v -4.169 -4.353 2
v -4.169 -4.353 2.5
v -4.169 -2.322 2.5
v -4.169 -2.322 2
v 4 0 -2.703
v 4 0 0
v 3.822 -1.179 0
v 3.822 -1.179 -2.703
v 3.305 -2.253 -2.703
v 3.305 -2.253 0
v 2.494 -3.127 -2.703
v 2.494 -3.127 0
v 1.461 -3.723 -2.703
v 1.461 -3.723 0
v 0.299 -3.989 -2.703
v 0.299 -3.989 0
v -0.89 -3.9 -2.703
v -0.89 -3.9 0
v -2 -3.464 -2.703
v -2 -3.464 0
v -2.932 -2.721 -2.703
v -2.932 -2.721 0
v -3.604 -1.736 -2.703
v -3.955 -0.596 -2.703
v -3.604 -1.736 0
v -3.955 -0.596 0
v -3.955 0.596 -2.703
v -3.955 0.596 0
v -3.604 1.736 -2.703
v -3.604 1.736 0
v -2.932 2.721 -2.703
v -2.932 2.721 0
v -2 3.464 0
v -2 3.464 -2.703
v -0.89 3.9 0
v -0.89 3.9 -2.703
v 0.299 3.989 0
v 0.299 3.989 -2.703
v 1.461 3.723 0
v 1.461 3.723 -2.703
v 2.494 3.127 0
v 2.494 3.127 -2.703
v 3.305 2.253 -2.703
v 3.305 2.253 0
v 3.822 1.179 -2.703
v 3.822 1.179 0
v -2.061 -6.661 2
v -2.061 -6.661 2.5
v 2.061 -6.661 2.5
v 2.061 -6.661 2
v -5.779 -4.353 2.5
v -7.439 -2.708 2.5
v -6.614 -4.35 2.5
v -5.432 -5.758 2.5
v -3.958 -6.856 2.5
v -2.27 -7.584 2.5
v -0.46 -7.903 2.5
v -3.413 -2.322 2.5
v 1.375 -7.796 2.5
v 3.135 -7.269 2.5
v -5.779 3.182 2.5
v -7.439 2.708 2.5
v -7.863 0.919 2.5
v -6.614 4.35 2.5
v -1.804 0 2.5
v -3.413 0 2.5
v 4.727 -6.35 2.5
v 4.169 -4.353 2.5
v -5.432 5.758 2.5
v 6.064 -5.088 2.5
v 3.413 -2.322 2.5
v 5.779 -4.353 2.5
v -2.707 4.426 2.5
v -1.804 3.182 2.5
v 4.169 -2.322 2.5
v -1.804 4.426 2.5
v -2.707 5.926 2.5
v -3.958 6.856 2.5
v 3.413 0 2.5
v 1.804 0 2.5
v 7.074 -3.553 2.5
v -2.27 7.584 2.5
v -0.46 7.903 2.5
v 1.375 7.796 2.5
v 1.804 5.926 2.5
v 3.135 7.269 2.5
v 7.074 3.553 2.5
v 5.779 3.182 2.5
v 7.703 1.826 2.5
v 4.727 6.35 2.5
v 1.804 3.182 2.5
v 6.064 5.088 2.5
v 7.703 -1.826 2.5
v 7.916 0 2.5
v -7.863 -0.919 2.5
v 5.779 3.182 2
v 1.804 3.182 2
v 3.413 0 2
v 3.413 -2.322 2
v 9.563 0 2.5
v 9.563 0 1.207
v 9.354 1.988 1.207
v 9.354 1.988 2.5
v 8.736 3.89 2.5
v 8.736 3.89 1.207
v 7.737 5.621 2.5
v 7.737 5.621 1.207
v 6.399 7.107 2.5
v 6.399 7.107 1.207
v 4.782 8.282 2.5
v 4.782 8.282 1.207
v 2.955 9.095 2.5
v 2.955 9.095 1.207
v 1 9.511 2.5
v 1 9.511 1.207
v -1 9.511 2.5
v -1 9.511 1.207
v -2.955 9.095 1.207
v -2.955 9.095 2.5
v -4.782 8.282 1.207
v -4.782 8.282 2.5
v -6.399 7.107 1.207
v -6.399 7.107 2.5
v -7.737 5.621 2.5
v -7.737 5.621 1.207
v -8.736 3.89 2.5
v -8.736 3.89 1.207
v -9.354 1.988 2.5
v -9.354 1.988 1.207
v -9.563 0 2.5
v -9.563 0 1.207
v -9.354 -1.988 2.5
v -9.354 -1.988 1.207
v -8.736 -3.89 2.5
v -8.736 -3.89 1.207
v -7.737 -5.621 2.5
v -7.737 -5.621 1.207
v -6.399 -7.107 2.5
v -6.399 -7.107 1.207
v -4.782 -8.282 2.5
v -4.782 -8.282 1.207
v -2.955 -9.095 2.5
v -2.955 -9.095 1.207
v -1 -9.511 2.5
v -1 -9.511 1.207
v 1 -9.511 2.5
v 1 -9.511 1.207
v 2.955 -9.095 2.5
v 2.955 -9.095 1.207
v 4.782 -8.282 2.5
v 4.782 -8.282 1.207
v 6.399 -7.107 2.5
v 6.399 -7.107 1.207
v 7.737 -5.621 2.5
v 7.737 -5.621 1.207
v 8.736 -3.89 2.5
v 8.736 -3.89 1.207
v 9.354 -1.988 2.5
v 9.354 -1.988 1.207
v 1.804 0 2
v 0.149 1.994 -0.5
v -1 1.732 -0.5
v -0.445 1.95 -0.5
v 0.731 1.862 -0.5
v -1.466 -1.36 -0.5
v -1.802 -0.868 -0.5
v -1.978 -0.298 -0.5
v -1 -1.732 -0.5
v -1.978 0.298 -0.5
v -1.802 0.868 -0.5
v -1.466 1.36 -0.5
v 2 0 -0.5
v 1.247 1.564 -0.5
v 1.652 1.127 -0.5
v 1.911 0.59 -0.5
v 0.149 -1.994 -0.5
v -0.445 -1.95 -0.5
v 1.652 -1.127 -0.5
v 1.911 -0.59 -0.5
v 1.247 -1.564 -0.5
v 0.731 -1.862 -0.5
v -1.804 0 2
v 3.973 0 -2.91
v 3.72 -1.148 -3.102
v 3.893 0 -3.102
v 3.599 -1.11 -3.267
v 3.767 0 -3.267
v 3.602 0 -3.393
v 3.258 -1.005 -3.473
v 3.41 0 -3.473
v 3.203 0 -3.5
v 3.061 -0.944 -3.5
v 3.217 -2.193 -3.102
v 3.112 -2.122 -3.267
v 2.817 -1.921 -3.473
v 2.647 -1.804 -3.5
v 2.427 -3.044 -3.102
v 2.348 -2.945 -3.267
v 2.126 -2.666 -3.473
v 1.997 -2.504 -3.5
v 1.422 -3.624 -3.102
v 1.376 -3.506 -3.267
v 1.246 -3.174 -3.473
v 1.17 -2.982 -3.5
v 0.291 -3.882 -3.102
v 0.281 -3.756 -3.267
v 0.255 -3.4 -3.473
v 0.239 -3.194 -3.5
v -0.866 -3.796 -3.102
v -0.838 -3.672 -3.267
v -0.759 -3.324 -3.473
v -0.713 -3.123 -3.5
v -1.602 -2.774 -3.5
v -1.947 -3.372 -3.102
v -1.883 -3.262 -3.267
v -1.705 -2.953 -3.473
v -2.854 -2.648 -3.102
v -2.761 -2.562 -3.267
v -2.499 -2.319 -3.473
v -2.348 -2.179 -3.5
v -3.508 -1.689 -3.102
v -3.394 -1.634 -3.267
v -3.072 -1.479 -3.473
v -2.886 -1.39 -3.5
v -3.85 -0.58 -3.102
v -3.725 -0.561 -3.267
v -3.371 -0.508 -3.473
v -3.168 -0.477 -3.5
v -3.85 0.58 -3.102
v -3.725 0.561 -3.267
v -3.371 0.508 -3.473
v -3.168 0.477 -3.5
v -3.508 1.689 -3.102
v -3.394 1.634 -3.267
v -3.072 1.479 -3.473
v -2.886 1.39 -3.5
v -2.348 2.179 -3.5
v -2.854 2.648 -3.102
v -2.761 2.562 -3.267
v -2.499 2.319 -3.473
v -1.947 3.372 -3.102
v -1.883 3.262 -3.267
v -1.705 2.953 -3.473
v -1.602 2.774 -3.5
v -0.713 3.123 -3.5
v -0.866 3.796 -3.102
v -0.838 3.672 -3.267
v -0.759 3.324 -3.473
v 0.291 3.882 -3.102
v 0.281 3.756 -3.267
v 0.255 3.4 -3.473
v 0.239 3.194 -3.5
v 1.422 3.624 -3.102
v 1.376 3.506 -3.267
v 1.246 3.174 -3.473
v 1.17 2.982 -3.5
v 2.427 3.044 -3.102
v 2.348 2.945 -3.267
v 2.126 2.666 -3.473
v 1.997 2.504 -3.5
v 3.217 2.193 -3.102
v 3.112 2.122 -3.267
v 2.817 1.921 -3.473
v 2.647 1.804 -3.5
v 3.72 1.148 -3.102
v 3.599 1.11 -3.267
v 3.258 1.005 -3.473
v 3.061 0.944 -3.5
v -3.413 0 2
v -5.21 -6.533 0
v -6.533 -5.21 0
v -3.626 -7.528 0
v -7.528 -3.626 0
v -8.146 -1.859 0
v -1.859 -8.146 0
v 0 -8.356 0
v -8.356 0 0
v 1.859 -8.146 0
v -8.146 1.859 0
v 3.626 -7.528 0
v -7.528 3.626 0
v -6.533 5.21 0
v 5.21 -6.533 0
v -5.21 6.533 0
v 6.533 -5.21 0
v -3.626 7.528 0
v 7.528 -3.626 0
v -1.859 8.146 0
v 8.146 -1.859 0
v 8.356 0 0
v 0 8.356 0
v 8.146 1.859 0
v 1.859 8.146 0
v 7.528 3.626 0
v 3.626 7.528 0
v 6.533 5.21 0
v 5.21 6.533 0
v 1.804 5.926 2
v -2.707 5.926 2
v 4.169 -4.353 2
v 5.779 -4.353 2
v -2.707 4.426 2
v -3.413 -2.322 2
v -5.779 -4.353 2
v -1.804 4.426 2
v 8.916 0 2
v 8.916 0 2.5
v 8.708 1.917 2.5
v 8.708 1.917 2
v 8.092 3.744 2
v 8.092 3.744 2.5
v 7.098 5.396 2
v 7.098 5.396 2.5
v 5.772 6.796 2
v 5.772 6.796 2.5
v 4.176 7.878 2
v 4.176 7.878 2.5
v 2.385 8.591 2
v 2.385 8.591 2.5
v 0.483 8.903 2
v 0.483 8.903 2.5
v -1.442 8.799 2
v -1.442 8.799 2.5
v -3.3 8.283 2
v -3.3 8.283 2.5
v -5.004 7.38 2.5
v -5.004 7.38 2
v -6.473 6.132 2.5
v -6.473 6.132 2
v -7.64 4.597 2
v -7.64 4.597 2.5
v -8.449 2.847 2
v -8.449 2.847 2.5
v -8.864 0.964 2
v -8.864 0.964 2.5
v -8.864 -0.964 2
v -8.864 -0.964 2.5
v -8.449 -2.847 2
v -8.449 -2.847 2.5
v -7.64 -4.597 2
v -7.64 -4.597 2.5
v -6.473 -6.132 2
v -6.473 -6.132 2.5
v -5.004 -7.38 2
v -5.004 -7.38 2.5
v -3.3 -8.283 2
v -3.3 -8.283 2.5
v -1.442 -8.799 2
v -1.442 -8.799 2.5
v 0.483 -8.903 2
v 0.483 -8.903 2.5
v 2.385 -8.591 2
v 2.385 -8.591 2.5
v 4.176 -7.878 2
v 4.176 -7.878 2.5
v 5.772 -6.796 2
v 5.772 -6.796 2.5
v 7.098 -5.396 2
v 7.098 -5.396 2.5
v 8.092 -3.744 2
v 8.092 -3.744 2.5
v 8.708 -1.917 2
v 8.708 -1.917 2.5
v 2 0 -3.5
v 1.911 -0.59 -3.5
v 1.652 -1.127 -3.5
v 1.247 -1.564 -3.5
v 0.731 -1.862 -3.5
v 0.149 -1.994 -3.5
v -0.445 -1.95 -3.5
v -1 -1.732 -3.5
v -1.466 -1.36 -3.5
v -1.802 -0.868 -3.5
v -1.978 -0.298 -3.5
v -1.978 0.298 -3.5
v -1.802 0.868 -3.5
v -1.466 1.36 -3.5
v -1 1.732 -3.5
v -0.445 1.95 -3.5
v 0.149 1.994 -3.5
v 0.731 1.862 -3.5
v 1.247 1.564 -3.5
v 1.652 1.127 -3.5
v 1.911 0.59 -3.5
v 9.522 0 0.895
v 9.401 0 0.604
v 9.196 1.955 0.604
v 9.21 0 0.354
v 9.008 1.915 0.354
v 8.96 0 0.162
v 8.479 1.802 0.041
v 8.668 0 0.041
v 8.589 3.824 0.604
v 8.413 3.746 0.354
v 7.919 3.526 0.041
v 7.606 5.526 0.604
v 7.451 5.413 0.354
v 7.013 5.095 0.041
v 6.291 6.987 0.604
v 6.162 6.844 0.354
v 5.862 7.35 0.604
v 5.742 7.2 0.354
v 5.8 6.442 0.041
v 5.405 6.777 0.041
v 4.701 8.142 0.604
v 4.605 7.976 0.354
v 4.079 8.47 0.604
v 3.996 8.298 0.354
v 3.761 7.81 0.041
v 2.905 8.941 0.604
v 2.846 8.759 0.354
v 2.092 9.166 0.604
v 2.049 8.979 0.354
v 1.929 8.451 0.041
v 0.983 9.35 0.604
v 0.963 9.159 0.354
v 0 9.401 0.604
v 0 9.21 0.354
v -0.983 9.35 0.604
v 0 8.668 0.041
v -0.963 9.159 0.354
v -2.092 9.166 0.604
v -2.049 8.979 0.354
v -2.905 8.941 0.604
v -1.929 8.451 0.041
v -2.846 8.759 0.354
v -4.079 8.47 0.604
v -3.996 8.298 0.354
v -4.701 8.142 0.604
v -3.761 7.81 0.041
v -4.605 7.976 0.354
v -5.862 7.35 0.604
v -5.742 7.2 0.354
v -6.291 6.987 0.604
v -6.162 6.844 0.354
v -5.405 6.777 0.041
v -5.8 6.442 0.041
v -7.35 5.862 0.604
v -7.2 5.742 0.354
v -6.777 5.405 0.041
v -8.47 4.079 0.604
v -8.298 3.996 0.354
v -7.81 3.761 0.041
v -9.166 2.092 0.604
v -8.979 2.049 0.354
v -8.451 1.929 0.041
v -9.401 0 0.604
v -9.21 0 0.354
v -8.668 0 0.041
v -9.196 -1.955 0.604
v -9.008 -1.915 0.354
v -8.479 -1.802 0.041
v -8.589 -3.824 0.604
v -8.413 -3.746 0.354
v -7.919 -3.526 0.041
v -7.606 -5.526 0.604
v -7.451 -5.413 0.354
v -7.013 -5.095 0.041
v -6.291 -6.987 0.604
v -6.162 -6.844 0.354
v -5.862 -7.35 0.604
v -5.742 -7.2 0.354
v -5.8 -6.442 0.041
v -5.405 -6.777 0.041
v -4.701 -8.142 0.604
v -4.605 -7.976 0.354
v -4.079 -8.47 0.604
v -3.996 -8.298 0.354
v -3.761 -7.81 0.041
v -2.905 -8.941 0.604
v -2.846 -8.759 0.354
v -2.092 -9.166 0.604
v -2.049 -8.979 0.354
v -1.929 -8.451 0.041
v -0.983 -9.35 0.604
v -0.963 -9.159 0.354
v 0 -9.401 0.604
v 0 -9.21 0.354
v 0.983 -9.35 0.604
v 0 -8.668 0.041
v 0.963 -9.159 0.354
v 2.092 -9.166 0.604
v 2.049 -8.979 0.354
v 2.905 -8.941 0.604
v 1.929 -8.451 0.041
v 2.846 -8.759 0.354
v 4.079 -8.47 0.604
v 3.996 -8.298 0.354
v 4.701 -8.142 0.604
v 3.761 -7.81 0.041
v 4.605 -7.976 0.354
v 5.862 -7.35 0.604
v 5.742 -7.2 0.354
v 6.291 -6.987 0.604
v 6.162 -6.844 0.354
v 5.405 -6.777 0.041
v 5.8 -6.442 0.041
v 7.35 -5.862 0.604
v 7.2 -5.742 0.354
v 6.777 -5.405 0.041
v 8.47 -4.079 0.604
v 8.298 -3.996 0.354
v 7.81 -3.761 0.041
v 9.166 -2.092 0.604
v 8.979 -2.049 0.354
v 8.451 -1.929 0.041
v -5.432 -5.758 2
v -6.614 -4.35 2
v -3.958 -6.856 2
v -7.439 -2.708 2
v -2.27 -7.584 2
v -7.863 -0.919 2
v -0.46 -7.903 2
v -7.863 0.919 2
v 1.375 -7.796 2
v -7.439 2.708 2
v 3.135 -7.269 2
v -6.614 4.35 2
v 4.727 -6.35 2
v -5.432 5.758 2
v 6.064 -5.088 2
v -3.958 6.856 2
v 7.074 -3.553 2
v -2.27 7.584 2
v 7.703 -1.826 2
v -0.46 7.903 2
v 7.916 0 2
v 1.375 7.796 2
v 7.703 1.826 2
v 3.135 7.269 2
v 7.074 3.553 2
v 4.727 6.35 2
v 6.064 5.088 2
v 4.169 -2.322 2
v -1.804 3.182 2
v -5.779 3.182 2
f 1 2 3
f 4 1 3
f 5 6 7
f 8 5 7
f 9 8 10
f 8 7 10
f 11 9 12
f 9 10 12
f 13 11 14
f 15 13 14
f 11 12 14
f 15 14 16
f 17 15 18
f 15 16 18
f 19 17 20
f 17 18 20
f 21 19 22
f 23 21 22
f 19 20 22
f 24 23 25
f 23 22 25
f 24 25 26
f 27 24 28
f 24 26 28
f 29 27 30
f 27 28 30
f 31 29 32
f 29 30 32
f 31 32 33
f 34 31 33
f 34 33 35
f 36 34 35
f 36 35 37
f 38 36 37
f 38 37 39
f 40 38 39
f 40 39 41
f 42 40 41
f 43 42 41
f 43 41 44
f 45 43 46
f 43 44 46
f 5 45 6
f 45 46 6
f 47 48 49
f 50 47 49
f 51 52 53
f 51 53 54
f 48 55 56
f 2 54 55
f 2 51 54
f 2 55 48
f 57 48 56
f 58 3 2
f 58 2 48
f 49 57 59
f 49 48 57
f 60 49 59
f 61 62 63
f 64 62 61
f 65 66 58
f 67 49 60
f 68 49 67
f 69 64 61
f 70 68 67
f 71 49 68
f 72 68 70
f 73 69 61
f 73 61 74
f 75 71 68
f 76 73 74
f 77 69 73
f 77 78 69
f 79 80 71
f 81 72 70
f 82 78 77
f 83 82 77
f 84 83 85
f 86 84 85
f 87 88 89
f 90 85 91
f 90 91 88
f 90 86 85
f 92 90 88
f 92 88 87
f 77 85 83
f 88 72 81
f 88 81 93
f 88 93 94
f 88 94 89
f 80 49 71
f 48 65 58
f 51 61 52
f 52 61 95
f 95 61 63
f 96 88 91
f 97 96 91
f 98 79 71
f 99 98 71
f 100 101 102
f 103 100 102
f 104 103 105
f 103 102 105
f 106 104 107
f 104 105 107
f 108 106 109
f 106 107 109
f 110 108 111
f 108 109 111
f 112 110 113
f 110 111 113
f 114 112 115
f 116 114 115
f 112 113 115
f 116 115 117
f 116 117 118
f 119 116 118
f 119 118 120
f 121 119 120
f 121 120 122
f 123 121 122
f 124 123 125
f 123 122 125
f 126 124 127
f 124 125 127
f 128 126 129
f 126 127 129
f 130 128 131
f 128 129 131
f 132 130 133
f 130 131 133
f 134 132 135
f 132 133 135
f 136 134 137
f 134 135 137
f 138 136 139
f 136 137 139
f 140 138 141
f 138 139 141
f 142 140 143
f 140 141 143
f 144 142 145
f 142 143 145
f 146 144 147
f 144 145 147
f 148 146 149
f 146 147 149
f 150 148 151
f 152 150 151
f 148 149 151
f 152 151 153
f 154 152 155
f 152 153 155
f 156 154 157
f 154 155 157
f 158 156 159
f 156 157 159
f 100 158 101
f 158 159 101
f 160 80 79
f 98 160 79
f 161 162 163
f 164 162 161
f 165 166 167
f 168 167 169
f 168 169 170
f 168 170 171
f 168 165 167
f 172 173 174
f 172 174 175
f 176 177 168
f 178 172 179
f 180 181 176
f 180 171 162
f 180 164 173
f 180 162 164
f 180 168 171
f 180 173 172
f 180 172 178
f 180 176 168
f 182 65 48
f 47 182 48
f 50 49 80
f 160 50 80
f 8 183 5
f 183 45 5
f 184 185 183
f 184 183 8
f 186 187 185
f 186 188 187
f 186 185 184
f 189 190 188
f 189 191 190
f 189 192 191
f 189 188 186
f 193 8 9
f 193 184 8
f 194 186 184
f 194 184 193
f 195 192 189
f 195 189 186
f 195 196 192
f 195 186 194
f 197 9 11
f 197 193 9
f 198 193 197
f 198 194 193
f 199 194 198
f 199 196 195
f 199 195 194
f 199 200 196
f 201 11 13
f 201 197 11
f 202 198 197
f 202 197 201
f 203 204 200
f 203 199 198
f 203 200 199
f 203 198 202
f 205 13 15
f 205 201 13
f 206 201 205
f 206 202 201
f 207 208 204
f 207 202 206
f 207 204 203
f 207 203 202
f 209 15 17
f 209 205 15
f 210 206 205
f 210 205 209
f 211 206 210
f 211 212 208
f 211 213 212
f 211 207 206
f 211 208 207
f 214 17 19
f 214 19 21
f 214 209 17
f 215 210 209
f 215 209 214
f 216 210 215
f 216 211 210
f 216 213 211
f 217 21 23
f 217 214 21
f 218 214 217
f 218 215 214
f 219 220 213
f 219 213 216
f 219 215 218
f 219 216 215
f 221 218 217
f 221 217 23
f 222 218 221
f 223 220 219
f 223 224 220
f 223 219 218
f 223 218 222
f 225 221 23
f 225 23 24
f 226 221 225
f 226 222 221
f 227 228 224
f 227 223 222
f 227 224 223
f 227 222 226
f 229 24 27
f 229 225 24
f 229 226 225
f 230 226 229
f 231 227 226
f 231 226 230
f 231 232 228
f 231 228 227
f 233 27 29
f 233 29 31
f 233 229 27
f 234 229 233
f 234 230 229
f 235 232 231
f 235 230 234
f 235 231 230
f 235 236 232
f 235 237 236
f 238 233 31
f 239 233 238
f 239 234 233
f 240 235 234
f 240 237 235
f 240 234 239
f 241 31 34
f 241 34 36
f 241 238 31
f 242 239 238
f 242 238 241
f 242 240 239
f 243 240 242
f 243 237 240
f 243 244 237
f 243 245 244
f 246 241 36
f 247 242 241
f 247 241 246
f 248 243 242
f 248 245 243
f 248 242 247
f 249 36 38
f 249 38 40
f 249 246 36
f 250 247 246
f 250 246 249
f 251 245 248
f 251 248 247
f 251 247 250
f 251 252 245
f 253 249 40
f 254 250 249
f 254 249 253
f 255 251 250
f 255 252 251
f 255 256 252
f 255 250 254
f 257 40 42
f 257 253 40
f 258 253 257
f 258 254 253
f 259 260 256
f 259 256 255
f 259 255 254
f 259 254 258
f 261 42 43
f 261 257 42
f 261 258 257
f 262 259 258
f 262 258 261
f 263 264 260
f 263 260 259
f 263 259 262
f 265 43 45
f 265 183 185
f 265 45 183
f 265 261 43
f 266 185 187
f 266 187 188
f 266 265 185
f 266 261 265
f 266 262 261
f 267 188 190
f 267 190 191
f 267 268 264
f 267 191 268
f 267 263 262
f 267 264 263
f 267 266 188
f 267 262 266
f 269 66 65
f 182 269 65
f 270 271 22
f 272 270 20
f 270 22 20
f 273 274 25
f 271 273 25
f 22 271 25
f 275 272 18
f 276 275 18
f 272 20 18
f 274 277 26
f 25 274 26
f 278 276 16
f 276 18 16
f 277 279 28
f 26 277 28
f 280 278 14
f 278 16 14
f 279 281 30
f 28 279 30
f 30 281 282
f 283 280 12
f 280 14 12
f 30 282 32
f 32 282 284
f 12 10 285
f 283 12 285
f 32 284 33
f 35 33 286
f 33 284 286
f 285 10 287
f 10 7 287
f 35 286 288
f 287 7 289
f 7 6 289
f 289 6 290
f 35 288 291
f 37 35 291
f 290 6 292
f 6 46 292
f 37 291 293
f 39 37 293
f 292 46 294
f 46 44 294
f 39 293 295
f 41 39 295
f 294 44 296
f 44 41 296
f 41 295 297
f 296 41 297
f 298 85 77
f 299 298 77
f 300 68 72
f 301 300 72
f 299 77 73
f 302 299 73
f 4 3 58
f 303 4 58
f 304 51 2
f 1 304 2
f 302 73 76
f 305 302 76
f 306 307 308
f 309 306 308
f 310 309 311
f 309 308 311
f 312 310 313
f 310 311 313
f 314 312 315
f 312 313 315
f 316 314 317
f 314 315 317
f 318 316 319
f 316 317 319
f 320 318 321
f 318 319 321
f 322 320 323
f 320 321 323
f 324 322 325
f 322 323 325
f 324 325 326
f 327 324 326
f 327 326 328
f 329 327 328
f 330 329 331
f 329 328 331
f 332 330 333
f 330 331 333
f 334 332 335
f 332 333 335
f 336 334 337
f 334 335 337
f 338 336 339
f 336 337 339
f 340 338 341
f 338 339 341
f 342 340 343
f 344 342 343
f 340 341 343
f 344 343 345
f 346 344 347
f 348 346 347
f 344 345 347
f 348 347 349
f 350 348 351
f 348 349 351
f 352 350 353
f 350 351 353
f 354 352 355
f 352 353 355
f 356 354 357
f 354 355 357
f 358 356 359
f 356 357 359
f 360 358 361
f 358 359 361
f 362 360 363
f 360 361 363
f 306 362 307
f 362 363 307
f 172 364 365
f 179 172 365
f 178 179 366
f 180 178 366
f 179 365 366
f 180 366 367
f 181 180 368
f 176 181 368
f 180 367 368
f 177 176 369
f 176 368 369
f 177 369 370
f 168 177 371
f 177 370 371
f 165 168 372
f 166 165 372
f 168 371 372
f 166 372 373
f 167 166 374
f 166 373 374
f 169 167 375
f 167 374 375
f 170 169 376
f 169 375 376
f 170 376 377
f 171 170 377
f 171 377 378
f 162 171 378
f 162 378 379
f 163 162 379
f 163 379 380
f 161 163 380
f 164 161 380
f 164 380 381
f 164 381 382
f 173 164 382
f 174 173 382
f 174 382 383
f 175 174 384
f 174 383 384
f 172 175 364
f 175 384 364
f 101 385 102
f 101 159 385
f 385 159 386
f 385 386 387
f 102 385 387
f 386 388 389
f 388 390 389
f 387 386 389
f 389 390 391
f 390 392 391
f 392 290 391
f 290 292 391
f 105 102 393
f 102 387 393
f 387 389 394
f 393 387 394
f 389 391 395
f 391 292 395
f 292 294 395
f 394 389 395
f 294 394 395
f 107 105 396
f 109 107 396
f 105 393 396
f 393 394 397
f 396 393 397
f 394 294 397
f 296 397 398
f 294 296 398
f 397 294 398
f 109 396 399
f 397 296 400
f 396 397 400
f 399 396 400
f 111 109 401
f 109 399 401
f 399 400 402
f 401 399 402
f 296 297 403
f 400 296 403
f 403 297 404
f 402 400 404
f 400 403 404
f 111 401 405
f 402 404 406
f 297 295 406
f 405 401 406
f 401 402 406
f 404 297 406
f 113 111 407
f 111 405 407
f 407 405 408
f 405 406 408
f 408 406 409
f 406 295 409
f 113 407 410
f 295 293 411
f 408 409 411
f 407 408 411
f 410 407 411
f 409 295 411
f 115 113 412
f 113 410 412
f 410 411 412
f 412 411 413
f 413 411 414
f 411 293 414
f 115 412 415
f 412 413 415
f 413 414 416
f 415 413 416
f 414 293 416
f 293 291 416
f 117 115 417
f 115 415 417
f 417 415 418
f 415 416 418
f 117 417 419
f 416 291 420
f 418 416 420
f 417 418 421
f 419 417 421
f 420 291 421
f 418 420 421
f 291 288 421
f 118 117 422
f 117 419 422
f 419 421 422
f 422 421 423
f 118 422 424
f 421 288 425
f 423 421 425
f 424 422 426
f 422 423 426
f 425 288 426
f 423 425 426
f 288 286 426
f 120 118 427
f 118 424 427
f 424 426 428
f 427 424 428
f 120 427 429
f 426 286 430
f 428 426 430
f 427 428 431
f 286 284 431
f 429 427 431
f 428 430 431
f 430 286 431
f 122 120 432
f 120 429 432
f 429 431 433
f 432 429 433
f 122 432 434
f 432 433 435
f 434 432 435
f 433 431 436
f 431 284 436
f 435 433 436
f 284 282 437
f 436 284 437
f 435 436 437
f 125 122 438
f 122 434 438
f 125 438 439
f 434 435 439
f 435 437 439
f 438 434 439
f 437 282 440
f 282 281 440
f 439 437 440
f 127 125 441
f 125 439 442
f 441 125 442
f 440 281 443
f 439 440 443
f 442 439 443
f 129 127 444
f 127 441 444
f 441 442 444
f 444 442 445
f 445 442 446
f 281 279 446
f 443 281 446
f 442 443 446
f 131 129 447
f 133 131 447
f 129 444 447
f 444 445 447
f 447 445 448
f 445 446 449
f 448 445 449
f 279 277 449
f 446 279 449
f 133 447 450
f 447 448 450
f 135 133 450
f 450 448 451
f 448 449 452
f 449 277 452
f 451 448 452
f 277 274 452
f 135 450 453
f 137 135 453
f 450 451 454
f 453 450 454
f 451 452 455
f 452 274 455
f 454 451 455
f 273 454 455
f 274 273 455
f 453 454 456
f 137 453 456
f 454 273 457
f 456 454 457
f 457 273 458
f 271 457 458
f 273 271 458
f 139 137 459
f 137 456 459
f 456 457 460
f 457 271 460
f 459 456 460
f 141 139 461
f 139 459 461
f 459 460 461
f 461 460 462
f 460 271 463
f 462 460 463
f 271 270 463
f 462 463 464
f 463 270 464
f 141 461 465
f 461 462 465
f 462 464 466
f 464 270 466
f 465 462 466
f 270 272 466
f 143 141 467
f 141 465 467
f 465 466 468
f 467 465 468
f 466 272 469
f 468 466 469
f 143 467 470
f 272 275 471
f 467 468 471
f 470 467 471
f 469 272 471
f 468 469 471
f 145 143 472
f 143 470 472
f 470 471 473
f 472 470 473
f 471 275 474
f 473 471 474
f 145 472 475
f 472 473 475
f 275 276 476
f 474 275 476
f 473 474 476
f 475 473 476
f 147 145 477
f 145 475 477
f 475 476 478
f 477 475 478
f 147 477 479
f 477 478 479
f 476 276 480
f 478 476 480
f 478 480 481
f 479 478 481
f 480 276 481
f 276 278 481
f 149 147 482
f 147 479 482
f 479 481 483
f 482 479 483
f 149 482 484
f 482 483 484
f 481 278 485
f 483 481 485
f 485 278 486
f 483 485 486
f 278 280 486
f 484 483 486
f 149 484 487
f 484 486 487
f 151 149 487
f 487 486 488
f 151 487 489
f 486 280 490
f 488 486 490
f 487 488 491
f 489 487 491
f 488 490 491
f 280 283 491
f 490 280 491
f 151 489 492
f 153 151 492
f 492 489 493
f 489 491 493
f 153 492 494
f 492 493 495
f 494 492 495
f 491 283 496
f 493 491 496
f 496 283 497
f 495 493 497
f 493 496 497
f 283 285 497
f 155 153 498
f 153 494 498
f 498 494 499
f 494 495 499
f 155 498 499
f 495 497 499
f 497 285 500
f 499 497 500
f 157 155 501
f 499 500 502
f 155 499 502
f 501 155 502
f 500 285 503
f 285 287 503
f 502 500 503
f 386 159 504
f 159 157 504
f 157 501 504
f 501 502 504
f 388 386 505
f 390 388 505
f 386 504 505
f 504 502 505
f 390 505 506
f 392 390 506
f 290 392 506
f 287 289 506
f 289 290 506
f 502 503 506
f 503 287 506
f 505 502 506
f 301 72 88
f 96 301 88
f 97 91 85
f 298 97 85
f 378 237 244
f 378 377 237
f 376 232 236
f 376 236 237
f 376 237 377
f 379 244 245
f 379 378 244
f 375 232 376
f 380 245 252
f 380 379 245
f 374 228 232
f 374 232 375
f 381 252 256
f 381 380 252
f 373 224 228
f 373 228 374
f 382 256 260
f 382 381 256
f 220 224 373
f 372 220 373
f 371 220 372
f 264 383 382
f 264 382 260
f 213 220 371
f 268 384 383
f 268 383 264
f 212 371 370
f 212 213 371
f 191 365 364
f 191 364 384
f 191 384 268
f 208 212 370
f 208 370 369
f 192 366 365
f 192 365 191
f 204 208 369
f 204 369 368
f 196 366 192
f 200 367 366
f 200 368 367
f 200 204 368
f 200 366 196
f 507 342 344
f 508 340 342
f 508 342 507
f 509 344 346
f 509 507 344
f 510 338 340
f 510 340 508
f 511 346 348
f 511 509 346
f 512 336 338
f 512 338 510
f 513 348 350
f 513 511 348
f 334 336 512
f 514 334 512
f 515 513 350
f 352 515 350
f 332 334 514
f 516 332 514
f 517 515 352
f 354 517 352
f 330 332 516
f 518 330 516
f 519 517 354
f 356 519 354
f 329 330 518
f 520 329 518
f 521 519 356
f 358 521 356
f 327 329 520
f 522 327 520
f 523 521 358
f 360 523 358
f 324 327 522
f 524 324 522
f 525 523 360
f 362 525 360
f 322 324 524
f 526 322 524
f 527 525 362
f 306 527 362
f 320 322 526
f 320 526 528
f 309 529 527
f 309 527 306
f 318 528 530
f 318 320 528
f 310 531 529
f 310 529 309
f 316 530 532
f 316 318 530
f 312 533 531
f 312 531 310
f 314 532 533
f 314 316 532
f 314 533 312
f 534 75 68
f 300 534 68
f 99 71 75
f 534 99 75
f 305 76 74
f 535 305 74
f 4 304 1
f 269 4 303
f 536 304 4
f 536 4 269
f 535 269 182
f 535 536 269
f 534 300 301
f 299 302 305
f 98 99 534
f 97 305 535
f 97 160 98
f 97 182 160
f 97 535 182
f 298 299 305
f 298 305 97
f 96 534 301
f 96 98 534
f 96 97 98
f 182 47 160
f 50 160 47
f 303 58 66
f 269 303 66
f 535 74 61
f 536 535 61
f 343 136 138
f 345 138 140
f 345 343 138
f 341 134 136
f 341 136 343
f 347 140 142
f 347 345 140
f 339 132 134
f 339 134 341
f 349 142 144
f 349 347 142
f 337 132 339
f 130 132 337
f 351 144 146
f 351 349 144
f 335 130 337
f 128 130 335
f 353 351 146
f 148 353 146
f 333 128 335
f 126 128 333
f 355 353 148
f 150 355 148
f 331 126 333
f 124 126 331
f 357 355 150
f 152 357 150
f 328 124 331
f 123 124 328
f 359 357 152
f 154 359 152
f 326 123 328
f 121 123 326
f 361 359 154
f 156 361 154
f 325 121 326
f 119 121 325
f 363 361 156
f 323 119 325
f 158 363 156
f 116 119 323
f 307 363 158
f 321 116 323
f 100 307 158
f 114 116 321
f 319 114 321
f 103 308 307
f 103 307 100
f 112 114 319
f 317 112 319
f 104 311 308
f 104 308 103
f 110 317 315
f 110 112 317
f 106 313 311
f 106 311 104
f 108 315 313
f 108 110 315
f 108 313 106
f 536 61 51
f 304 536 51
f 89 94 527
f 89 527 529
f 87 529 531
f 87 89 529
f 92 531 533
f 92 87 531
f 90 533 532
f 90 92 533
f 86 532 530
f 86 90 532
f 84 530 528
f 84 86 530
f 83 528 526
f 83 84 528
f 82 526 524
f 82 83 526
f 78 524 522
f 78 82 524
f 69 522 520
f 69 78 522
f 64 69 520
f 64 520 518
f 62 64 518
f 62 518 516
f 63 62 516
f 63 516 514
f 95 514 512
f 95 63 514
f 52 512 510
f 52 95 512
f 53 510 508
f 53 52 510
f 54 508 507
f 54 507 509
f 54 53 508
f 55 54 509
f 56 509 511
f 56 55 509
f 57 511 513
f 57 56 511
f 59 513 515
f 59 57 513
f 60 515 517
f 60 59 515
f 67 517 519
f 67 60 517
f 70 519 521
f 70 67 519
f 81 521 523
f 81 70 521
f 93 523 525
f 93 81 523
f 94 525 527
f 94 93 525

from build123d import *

# Parameters (mm, degrees)
F0_R     = 9.5631
F1_DEPTH = 2.5
F2_R     = 8.9162314004
F2_R_2   = 7.9162314004
F3_DEPTH = 0.5
F4_R     = 4
F5_DEPTH = 3.5
F6_R     = 1.2071067812
F7_R     = 2
F8_DEPTH = 3
F9_R     = 0.7966904756


with BuildPart() as f1:
    # F0 (on Top) → F1 (new body)
    with BuildSketch(Plane.XY):
        Circle(F0_R)
    extrude(amount=F1_DEPTH)

    # F2 (on face) → F3 (cut)
    with BuildSketch(Plane.XY.offset(2.5)):
        Circle(F2_R)
        Circle(F2_R_2, mode=Mode.SUBTRACT)
        Polygon((1.8036346717, 5.9258921407), (-2.7067440096, 5.9258921407), (-2.7067440096, 4.4258921407), (-1.8036346717, 4.4258921407), (-1.8036346717, 3.1822535675), (-5.7792644948, 3.1822535675), (-5.7792644948, -4.3527372181), (-4.1694175287, -4.3527372181), (-4.1694175287, -2.3218090646), (-3.4134816378, -2.3218090646), (-3.4134816378, 0), (-1.8036346717, 0), (-2.0609125495, -6.6612055525), (0, -6.6612055525), (2.0609125495, -6.6612055525), (1.8036346717, 0), (3.4134816378, 0), (3.4134816378, -2.3218090646), (4.1694175287, -2.3218090646), (4.1694175287, -4.3527372181), (5.7792644948, -4.3527372181), (5.7792644948, 3.1822535675), (1.8036346717, 3.1822535675), align=None)
    extrude(amount=-F3_DEPTH, mode=Mode.SUBTRACT)

    # F4 (on face) → F5 (join)
    with BuildSketch(Plane(origin=(0, 0, 0), x_dir=(1, 0, 0), z_dir=(0, 0, -1))):
        Circle(F4_R)
    extrude(amount=F5_DEPTH)

    # F6
    f6_edges = [f1.edges().sort_by_distance(p)[0] for p in [
        (-9.5631, 0, 0),
    ]]
    fillet(f6_edges, radius=F6_R)

    # F7 (on face) → F8 (cut)
    with BuildSketch(Plane(origin=(0, 0, -3.5), x_dir=(1, 0, 0), z_dir=(0, 0, -1))):
        Circle(F7_R)
    extrude(amount=-F8_DEPTH, mode=Mode.SUBTRACT)

    # F9
    f9_edges = [f1.edges().sort_by_distance(p)[0] for p in [
        (-4, 0, -3.5),
    ]]
    fillet(f9_edges, radius=F9_R)


solid = f1.part
